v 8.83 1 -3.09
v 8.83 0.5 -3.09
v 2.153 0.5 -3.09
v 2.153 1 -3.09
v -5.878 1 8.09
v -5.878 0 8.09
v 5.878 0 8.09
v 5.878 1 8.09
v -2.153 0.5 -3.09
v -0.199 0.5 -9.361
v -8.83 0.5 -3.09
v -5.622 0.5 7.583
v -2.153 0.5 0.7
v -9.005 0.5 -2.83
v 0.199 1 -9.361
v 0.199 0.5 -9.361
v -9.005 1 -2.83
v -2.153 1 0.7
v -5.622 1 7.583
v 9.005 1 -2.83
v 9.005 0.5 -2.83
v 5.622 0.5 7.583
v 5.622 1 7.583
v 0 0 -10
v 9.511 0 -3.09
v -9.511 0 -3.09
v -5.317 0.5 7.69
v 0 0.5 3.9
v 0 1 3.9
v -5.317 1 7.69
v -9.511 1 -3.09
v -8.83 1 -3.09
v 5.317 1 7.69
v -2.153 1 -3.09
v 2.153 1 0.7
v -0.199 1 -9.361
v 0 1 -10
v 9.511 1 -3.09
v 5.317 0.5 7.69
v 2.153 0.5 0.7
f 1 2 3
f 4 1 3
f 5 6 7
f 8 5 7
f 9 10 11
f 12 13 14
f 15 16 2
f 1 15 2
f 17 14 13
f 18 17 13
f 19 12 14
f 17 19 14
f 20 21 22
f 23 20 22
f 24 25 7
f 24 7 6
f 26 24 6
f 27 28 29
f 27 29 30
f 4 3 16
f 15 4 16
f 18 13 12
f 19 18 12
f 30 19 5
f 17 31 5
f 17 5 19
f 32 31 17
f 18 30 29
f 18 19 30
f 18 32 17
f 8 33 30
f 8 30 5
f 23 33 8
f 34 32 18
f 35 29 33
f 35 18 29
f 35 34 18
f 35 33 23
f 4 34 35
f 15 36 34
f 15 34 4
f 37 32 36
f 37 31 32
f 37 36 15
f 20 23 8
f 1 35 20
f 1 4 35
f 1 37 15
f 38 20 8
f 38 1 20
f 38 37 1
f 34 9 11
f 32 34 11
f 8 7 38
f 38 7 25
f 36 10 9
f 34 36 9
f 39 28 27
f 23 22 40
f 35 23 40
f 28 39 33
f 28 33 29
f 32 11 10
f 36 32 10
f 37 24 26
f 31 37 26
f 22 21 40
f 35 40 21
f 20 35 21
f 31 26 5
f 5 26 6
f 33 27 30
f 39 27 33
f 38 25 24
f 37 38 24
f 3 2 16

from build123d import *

# Parameters (mm, degrees)
BOSS_EXTRUDE1_DEPTH = 1
BOSS_EXTRUDE2_DEPTH = 0.5


with BuildPart() as part:
    # Sketch1 → Boss-Extrude1 (new body)
    with BuildSketch(Plane(origin=(0, 0, 0), x_dir=(1, 0, 0), z_dir=(0, 1, 0))):
        Polygon((5.877852523, -8.090169944), (9.510565163, 3.090169944), (0, 10), (-9.510565163, 3.090169944), (-5.877852523, -8.090169944), align=None)
        Polygon((-5.316743775, -7.690169944), (5.316743775, -7.690169944), (0, -3.9), align=None, mode=Mode.SUBTRACT)
        Polygon((5.622138751, -7.582748818), (2.153438567, -0.699694605), (9.005433722, 2.829962413), align=None, mode=Mode.SUBTRACT)
        Polygon((8.830044516, 3.090169944), (2.153438567, 3.090169944), (0.199189097, 9.360853459), align=None, mode=Mode.SUBTRACT)
        Polygon((-0.199189097, 9.360853459), (-2.153438567, 3.090169944), (-8.830044516, 3.090169944), align=None, mode=Mode.SUBTRACT)
        Polygon((-9.005433722, 2.829962413), (-2.153438567, -0.699694605), (-5.622138751, -7.582748818), align=None, mode=Mode.SUBTRACT)
    extrude(amount=BOSS_EXTRUDE1_DEPTH)

    # Sketch1<2> → Boss-Extrude2 (add)
    with BuildSketch(Plane(origin=(0, 0, 0), x_dir=(1, 0, 0), z_dir=(0, 1, 0))):
        Polygon((0, -3.9), (-5.316743775, -7.690169944), (5.316743775, -7.690169944), align=None)
        Polygon((2.153438567, -0.699694605), (5.622138751, -7.582748818), (9.005433722, 2.829962413), align=None)
        Polygon((2.153438567, 3.090169944), (8.830044516, 3.090169944), (0.199189097, 9.360853459), align=None)
        Polygon((-2.153438567, 3.090169944), (-0.199189097, 9.360853459), (-8.830044516, 3.090169944), align=None)
        Polygon((-2.153438567, -0.699694605), (-9.005433722, 2.829962413), (-5.622138751, -7.582748818), align=None)
    extrude(amount=BOSS_EXTRUDE2_DEPTH)


solid = part.part
